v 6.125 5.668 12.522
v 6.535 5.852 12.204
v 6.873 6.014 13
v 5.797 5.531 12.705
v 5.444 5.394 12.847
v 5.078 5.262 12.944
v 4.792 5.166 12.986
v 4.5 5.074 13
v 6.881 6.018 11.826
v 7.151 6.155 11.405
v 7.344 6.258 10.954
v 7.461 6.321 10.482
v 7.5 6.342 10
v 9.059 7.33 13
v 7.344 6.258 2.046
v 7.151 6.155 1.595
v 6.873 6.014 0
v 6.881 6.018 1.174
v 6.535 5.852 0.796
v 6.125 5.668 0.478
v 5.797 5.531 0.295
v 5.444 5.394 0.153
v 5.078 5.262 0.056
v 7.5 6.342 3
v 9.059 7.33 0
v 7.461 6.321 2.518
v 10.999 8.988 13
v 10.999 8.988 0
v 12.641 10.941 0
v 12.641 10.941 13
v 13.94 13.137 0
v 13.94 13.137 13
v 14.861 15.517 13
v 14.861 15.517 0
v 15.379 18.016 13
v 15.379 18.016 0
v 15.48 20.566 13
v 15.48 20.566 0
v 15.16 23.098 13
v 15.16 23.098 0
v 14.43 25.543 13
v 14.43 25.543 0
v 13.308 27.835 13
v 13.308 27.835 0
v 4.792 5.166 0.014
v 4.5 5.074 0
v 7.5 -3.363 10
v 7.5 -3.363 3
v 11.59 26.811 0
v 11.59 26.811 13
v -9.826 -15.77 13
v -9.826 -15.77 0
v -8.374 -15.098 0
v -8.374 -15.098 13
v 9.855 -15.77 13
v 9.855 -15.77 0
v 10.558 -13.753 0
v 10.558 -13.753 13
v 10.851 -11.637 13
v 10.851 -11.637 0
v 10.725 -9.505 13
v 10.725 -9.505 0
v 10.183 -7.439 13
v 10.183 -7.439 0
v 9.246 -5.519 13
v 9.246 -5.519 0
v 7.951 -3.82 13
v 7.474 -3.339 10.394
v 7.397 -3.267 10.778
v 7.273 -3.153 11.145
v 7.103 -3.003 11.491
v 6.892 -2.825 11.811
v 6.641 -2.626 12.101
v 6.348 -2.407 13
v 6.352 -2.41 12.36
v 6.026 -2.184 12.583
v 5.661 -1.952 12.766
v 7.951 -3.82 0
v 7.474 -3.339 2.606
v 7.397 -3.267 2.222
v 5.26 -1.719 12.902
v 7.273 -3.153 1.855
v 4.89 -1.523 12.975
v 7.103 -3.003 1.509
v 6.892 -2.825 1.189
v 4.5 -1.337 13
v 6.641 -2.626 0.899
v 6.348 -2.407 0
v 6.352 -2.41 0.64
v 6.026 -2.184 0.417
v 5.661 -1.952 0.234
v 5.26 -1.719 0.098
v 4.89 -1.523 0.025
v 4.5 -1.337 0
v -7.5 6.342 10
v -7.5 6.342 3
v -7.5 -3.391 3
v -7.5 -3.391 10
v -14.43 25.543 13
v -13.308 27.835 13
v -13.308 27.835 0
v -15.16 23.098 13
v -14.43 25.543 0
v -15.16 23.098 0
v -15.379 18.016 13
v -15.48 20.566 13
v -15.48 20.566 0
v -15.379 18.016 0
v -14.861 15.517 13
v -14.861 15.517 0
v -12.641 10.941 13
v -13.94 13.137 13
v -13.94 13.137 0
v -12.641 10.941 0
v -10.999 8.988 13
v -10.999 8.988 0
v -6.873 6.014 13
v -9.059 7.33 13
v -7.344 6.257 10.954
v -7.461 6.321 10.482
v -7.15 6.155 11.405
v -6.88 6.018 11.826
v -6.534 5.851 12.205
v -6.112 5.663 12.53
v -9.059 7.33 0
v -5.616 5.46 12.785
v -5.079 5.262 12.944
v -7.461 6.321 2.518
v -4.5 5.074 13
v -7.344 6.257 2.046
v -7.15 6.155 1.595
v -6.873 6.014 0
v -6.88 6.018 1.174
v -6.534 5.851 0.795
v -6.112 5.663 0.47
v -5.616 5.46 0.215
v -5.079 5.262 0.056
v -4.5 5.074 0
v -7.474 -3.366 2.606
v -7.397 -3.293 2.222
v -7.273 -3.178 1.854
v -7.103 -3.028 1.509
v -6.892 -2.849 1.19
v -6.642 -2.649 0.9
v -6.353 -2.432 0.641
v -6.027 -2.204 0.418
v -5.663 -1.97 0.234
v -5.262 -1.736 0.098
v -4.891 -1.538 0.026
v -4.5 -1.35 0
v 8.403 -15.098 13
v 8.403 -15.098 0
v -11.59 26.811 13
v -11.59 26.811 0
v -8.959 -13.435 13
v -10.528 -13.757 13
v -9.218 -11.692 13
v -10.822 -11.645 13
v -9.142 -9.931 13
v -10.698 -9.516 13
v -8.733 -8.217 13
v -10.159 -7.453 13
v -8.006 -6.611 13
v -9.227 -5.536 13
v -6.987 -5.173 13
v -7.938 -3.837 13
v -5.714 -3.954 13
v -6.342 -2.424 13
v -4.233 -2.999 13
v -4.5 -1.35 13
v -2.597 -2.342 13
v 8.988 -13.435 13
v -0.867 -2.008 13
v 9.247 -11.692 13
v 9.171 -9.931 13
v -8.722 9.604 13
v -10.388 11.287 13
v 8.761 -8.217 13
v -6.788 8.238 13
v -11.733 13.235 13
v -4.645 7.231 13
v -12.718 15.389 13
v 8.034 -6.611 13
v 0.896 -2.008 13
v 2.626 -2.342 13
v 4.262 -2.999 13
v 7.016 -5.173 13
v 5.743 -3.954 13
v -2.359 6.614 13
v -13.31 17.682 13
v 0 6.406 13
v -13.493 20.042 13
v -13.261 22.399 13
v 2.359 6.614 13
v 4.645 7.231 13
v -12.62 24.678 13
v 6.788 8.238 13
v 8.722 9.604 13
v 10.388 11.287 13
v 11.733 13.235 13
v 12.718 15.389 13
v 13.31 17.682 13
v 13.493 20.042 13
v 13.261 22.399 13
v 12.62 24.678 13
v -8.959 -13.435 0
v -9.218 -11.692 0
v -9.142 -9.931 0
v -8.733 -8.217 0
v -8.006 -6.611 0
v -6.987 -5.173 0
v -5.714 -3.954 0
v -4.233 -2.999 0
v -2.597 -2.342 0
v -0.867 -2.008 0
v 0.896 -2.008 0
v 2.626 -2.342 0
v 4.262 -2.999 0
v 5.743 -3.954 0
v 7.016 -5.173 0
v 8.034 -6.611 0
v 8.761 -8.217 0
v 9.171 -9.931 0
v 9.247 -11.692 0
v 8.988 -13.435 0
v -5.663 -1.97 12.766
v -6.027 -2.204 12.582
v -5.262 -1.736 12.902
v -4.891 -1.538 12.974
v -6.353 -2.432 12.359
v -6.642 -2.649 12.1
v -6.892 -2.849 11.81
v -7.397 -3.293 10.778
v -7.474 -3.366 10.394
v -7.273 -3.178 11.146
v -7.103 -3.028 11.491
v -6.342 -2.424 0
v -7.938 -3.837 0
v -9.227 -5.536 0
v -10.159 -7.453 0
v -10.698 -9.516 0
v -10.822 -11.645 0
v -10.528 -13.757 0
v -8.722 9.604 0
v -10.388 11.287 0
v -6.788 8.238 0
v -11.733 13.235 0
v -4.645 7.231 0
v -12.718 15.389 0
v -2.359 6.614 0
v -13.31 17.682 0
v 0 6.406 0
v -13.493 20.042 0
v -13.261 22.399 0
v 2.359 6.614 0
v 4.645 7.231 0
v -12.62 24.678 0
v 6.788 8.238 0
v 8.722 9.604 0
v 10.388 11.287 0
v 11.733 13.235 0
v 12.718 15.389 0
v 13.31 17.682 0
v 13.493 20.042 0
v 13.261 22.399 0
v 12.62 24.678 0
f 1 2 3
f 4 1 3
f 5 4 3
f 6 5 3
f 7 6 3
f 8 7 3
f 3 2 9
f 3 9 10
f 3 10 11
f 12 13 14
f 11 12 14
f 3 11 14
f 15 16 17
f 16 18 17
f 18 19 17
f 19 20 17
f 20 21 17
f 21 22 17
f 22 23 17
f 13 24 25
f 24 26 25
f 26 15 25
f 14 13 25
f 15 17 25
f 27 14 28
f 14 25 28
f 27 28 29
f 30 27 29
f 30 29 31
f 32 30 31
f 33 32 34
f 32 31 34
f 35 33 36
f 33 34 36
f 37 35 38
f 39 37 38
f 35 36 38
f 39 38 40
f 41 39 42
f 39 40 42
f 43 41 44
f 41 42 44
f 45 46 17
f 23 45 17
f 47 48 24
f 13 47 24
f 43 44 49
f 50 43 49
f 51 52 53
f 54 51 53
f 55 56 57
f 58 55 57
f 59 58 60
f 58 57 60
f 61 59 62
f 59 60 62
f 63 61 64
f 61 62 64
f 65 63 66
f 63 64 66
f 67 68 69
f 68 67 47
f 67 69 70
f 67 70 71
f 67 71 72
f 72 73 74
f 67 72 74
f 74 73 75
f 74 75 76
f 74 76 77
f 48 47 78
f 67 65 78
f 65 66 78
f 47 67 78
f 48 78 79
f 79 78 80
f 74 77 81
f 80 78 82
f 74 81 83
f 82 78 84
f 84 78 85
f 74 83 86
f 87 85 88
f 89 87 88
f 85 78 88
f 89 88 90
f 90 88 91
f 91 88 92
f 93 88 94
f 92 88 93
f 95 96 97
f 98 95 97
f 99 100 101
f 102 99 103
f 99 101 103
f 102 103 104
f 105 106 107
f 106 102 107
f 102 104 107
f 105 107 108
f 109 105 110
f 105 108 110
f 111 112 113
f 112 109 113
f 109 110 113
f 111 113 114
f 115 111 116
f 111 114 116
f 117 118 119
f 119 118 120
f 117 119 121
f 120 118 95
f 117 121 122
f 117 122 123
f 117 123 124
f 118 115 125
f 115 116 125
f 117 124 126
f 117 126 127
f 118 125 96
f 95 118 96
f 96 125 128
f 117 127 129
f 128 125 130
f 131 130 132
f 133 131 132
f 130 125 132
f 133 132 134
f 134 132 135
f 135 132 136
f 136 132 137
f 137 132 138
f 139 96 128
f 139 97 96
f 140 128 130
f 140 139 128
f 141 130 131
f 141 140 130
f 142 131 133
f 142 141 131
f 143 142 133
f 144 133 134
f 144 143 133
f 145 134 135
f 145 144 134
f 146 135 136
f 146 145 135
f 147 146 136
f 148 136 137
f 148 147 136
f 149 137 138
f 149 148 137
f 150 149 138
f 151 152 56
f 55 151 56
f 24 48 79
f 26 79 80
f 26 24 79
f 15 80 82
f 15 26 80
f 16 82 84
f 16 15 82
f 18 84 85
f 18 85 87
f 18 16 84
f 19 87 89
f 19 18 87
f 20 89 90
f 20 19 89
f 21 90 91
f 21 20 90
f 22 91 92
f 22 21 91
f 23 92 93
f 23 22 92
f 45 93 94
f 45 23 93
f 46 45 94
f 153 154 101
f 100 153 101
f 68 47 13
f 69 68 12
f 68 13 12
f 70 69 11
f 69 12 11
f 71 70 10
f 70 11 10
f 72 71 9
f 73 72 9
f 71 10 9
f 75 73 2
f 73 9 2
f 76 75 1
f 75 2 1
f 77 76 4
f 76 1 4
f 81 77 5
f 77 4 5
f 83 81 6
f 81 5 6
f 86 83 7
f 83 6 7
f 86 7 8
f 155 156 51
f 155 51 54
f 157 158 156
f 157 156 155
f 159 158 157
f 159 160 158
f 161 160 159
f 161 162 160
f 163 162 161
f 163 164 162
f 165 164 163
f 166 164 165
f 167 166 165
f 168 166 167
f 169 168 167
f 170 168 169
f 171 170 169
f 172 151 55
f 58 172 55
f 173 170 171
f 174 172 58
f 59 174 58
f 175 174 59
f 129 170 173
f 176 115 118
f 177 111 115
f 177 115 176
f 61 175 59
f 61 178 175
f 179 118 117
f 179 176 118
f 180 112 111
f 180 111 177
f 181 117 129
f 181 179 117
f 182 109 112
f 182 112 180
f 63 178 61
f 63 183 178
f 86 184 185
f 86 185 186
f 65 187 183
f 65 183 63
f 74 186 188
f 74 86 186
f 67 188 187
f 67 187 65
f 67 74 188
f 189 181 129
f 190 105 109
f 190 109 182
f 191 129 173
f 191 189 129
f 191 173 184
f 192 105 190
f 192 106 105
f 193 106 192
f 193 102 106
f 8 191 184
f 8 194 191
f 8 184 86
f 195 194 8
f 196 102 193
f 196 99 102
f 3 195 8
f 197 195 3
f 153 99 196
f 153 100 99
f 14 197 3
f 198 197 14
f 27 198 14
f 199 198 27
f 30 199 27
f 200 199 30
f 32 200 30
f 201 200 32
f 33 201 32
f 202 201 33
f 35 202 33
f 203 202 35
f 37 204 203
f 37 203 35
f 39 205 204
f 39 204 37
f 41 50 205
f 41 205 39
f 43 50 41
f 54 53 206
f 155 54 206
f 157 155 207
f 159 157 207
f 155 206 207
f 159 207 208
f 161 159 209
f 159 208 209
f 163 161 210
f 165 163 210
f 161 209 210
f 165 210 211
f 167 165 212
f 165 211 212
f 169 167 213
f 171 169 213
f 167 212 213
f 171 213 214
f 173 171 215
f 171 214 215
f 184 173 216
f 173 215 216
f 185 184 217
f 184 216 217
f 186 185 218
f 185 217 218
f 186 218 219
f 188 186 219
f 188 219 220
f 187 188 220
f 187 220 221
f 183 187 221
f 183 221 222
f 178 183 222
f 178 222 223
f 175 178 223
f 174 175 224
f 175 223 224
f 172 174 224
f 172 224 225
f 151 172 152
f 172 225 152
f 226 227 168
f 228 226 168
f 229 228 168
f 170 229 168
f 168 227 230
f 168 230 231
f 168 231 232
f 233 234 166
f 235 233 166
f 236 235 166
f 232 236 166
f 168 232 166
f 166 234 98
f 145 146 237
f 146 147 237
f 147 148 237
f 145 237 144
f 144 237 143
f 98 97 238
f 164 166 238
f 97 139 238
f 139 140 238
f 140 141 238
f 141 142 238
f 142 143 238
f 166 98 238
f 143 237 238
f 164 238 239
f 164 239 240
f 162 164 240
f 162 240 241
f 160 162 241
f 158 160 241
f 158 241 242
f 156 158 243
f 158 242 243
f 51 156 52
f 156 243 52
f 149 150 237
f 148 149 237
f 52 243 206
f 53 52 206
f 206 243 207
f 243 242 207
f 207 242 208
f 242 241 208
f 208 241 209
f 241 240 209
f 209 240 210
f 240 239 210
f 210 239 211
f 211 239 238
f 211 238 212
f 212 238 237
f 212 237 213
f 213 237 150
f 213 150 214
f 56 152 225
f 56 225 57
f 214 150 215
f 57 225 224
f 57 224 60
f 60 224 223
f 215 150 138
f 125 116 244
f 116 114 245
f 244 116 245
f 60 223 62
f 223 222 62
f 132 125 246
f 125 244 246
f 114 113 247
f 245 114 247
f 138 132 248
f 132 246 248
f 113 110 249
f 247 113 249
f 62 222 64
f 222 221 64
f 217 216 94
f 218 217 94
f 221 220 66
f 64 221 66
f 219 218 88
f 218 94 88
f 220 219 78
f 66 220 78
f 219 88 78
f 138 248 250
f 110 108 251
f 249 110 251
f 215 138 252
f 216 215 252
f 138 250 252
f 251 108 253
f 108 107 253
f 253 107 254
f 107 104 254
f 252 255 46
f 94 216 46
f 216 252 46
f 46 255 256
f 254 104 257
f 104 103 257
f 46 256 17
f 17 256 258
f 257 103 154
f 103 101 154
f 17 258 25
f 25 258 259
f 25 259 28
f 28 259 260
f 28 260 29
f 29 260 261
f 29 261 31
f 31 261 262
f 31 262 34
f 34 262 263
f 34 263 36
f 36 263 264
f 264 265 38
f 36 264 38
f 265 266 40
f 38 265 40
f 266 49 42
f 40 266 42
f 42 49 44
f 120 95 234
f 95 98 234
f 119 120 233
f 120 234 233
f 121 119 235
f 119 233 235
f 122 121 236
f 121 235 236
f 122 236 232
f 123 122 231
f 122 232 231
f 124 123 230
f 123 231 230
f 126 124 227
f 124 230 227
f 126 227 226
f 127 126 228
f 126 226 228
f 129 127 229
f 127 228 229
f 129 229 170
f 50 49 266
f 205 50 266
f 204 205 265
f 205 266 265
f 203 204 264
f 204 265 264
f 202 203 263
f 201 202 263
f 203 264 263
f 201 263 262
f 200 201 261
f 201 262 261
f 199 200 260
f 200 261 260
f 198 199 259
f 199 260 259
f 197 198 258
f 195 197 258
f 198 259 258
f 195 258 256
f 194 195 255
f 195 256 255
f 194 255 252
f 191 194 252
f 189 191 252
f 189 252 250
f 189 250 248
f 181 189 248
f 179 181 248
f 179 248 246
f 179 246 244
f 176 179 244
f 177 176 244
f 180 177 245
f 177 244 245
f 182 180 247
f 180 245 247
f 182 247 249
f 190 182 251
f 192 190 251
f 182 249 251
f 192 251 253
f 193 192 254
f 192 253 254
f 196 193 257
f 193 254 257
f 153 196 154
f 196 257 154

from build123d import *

# Parameters (mm, degrees)
F1_DEPTH = 13
F2_R     = 3


with BuildPart() as f1:
    # F0 (on Top) → F1 (new body)
    with BuildSketch(Plane.XY):
        with BuildLine():
            ThreePointArc((11.590273, 26.810686), (0, 6.40625), (-11.590273, 26.810686))
            Line((-11.590273, 26.810686), (-13.308113, 27.834907))
            ThreePointArc((-13.308113, 27.834907), (-14.957469, 15.858164), (-7.5, 6.342445))
            ThreePointArc((-7.5, 6.342445), (0, 4.40625), (7.5, 6.342445))
            ThreePointArc((7.5, 6.342445), (14.957469, 15.858164), (13.308113, 27.834907))
            Line((13.308113, 27.834907), (11.590273, 26.810686))
        make_face()
        with BuildLine():
            ThreePointArc((7.5, 6.342445), (0, 4.40625), (-7.5, 6.342445))
            Line((-7.5, 6.342445), (-7.5, -3.390785))
            ThreePointArc((-7.5, -3.390785), (-0.005535, -0.365641), (7.5, -3.363212))
            Line((7.5, -3.363212), (7.5, 6.342445))
        make_face()
        with BuildLine():
            ThreePointArc((7.5, -3.363212), (-0.005535, -0.365641), (-7.5, -3.390785))
            ThreePointArc((-7.5, -3.390785), (-10.644414, -9.208204), (-9.826055, -15.770215))
            Line((-9.826055, -15.770215), (-8.374253, -15.097704))
            ThreePointArc((-8.374253, -15.097704), (0.0144, -1.965623), (8.403054, -15.097704))
            Line((8.403054, -15.097704), (9.854855, -15.770215))
            ThreePointArc((9.854855, -15.770215), (10.669515, -9.188614), (7.5, -3.363212))
        make_face()
    extrude(amount=F1_DEPTH)

    # F2
    f2_edges = [f1.edges().sort_by_distance(p)[0] for p in [
        (7.5, 1.489616, 13),
        (-7.5, 1.47583, 13),
        (7.5, 1.489616, 0),
        (-7.5, 1.47583, 0),
    ]]
    fillet(f2_edges, radius=F2_R)


solid = f1.part
